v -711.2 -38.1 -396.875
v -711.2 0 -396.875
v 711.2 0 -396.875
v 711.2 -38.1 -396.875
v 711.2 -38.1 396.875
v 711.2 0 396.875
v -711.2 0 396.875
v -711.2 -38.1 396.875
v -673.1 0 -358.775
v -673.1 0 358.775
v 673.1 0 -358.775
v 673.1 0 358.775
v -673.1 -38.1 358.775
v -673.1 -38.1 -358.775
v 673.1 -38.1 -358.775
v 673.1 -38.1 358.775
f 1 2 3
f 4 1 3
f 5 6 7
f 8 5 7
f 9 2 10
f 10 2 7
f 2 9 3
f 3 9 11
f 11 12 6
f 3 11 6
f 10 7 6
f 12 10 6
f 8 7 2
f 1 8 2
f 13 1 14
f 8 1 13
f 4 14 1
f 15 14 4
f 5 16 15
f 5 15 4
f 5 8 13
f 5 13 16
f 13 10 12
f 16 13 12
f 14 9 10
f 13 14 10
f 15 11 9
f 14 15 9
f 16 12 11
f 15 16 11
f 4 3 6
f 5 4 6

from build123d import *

# Parameters (mm, degrees)
F0_W     = 241.3
F0_H     = 38.1
F1_DEPTH = 38.1


with BuildPart() as f1:
    # F0 (on Front) → F1 (new body)
    with BuildSketch(Plane.XZ):
        Polygon((711.2, 0), (711.2, 396.875), (241.3, 396.875), (241.3, 358.775), (673.1, 358.775), (673.1, 0), align=None)
        with Locations((120.65, 377.825)):
            Rectangle(F0_W, F0_H)
        Polygon((711.2, -396.875), (711.2, 0), (673.1, 0), (673.1, -358.775), (241.3, -358.775), (241.3, -396.875), align=None)
        with Locations((-120.65, 377.825)):
            Rectangle(F0_W, F0_H)
        Polygon((-241.3, 358.775), (-241.3, 396.875), (-711.2, 396.875), (-711.2, 0), (-673.1, 0), (-673.1, 358.775), align=None)
        with Locations((120.65, -377.825)):
            Rectangle(F0_W, F0_H)
        with Locations((-120.65, -377.825)):
            Rectangle(F0_W, F0_H)
        Polygon((-673.1, 0), (-711.2, 0), (-711.2, -396.875), (-241.3, -396.875), (-241.3, -358.775), (-673.1, -358.775), align=None)
    extrude(amount=F1_DEPTH)


solid = f1.part
